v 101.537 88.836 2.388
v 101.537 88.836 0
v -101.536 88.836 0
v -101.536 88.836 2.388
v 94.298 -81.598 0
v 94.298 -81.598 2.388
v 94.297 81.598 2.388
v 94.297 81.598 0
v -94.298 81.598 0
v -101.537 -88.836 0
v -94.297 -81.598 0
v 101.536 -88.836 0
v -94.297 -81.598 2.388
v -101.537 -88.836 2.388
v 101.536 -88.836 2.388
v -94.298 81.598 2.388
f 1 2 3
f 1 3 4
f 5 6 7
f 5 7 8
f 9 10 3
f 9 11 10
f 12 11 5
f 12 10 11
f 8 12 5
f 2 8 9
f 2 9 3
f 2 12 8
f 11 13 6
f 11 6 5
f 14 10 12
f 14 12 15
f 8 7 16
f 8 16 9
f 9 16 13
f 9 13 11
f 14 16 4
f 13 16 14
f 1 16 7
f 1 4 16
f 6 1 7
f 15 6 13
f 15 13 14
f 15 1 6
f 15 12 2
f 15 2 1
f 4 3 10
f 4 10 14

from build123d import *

# Parameters (mm, degrees)
SKETCH2_W = 2.3876
SKETCH2_H = 7.239


with BuildPart() as part:
    # Sweep1: sweep along a path in Sketch1
    with BuildLine(Plane.XY) as sweep1_path:
        Line((-97.917, 85.217), (97.917, 85.217))
        Line((97.917, 85.217), (97.917, -85.217))
        Line((97.917, -85.217), (-97.917, -85.217))
        Line((-97.917, -85.217), (-97.917, 85.217))
    # Sketch2 → Sweep1 (sweep)
    with BuildSketch(Plane(origin=(0, 0, 0), x_dir=(0, 0, -1), z_dir=(1, 0, 0))):
        with Locations((-1.1938, 85.217)):
            Rectangle(SKETCH2_W, SKETCH2_H)
    sweep(path=sweep1_path.line, transition=Transition.RIGHT)


solid = part.part
